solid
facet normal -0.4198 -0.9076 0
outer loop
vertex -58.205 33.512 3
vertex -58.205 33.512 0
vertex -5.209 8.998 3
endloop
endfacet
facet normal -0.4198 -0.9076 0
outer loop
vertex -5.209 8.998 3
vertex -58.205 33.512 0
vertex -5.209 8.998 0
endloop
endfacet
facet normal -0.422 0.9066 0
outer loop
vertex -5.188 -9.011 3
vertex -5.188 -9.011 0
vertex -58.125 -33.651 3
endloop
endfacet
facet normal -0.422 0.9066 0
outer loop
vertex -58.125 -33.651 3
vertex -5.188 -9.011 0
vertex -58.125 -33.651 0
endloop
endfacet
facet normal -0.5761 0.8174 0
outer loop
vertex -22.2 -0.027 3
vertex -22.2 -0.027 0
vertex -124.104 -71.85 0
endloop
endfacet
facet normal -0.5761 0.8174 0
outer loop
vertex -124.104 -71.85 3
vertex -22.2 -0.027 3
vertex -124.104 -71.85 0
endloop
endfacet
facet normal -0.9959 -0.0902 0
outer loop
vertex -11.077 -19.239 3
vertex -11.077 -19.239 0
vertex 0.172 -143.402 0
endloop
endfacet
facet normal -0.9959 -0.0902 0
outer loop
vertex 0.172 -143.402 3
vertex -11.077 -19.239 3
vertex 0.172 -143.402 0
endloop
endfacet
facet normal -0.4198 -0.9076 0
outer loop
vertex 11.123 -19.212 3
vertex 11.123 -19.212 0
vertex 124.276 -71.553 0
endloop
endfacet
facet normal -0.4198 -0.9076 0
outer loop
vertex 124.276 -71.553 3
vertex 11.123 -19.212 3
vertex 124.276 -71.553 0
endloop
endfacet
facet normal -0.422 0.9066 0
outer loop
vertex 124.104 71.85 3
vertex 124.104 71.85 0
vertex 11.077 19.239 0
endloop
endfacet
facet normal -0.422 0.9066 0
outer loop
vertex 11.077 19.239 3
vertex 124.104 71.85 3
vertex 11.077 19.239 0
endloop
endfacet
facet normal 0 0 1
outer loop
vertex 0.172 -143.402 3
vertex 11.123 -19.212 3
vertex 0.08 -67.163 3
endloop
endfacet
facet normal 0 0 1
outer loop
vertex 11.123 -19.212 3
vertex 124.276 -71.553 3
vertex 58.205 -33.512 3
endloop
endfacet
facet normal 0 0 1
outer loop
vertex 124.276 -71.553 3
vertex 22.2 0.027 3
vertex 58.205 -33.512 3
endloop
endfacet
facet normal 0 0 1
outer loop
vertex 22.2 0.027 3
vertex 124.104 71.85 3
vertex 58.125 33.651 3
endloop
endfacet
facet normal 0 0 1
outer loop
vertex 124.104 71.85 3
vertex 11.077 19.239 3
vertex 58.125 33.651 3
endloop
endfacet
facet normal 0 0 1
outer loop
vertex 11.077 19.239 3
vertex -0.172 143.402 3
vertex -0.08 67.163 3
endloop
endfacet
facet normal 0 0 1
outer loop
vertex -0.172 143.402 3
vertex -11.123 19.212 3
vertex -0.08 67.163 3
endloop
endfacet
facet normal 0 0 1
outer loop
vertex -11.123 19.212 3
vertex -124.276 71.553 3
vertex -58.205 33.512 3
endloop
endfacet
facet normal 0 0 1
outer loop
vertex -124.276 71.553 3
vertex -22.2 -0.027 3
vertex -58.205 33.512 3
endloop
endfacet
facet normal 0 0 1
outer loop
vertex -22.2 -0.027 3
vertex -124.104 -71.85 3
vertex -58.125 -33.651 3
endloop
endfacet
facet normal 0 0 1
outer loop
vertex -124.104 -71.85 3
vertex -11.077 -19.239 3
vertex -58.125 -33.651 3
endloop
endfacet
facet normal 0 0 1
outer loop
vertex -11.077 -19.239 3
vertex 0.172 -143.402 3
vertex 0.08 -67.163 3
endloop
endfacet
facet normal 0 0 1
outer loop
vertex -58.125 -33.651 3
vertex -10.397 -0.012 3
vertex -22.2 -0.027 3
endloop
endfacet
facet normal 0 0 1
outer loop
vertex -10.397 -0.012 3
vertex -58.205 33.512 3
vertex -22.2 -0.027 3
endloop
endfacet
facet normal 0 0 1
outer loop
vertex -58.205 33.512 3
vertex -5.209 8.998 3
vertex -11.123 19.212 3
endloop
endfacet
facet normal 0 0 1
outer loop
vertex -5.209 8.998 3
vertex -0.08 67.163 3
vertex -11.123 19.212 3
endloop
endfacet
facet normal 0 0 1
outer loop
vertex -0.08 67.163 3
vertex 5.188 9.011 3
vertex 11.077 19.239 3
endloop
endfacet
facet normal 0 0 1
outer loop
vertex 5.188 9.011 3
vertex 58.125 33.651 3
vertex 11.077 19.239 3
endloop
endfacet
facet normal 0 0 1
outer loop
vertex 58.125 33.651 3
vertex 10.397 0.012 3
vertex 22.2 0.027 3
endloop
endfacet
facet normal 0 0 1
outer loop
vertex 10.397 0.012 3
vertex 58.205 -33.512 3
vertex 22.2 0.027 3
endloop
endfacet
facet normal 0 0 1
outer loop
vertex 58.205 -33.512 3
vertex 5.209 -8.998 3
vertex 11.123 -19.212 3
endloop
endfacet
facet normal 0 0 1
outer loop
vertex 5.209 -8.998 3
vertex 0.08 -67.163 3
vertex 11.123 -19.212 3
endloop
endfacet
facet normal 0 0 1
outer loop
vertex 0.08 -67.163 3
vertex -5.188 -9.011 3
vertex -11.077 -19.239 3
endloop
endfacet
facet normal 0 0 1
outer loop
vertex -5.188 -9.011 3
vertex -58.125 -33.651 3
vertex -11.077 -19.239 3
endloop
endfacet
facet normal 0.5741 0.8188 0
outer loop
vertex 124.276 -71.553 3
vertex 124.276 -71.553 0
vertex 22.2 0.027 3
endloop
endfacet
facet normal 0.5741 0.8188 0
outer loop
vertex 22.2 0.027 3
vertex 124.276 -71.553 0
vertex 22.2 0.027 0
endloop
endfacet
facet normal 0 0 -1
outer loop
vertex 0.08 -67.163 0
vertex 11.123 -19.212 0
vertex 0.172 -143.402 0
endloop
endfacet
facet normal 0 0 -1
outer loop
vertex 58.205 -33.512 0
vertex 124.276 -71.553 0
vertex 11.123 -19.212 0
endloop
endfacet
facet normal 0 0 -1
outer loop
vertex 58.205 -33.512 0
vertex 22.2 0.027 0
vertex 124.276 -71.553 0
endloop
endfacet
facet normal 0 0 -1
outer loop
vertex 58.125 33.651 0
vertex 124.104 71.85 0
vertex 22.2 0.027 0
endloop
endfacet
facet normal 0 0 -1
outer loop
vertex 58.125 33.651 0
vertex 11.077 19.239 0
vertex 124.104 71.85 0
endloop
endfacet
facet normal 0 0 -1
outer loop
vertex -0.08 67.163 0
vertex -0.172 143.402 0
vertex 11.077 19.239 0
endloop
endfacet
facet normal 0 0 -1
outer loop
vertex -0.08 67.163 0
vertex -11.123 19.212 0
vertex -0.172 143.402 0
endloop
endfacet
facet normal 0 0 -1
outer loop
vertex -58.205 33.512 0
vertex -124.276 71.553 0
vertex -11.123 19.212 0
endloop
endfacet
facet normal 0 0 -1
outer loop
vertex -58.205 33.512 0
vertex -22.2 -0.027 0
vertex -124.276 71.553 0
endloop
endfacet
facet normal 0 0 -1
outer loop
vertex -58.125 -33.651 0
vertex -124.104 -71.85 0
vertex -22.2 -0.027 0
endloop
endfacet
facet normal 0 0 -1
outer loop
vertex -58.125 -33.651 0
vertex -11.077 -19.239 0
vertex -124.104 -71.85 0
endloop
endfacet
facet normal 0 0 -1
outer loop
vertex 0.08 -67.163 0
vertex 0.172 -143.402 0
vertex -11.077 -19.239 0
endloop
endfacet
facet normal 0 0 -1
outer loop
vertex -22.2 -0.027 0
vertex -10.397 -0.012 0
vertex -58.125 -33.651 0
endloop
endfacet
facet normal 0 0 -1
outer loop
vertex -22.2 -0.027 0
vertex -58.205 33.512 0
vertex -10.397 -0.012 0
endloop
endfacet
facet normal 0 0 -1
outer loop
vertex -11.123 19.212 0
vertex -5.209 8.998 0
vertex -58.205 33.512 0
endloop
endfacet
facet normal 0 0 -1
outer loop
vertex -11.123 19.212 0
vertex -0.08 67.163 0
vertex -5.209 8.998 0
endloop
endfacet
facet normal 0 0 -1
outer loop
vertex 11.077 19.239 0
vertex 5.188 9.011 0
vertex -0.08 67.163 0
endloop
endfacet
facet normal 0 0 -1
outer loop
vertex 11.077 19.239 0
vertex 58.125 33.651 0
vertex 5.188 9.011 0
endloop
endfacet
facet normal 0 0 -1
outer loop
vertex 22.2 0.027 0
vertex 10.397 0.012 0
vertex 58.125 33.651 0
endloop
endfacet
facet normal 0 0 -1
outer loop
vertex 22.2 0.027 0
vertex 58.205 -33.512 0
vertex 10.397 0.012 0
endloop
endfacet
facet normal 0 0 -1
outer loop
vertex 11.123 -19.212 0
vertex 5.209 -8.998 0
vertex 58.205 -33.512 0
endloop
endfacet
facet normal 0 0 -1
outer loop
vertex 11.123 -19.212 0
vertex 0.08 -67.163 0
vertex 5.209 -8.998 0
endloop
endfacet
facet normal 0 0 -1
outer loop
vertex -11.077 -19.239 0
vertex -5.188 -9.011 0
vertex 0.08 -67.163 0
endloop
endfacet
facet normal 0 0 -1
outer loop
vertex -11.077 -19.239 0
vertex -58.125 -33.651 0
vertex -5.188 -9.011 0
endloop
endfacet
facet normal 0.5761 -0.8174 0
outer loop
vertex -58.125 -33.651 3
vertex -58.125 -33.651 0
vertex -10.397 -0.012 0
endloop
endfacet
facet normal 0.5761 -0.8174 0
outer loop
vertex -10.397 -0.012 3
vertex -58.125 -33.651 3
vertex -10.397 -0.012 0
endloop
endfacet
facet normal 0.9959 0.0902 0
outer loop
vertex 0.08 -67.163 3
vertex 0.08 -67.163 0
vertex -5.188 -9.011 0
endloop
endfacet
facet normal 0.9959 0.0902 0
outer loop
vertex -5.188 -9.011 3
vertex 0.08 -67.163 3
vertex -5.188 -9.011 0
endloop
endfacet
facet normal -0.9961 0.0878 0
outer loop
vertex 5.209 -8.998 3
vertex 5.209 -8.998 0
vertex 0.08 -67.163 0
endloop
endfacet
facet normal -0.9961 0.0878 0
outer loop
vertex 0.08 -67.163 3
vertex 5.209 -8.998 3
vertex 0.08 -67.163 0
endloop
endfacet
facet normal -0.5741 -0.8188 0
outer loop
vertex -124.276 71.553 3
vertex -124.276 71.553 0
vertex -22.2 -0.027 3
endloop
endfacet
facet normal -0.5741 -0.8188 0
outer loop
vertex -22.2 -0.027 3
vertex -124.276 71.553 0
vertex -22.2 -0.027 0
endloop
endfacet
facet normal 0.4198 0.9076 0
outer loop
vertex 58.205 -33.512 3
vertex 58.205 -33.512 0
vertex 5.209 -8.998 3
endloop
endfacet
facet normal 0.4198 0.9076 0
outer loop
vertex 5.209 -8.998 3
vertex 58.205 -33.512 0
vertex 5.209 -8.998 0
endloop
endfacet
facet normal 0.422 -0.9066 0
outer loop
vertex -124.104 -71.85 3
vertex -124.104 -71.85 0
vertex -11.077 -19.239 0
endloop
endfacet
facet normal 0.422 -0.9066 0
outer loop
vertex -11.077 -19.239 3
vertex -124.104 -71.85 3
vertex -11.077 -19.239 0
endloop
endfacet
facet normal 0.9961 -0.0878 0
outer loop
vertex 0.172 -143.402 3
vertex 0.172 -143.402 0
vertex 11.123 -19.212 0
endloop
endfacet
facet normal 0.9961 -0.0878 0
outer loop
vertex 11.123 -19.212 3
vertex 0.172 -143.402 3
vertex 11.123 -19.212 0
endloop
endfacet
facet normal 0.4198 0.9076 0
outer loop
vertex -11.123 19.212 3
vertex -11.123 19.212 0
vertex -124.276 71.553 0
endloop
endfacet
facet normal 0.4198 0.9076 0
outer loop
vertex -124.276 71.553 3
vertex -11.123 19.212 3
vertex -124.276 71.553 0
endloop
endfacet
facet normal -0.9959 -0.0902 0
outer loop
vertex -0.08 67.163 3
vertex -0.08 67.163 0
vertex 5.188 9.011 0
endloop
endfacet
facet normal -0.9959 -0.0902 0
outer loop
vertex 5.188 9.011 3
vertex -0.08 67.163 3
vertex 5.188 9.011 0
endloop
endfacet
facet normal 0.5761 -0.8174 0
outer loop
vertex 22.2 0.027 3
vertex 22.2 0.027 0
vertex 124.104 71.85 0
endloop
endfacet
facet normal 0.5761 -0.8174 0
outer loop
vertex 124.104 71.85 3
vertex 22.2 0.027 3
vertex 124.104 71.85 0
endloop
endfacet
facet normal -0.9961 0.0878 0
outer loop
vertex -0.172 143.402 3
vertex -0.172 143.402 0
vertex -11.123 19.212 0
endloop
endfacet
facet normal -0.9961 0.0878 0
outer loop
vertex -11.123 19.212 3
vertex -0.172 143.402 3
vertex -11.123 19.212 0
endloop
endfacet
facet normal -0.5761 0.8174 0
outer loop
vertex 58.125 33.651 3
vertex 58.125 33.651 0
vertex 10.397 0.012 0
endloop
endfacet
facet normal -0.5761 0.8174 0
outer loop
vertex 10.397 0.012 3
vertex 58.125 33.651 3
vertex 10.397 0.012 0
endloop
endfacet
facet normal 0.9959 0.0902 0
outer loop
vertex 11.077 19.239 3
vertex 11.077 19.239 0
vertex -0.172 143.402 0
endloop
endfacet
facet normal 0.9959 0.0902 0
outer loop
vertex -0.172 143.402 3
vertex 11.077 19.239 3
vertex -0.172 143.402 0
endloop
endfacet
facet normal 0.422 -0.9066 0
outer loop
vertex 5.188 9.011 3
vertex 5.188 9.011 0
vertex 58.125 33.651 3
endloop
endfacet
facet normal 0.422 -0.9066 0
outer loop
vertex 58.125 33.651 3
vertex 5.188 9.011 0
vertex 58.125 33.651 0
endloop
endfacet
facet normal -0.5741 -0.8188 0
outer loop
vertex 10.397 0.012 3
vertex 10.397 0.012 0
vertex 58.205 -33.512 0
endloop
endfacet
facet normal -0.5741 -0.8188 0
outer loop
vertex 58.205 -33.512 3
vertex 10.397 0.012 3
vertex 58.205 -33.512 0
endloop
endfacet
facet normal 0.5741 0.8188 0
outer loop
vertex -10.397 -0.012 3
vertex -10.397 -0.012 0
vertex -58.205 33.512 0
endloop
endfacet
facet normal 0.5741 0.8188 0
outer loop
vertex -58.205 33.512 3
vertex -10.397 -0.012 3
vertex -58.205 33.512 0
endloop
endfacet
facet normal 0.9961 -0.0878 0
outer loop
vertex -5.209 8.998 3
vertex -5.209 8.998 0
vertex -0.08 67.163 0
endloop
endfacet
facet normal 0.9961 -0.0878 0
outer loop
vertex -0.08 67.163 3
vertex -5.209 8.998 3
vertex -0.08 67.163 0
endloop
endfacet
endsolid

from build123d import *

# Parameters (mm, degrees)
F1_DEPTH = 3


with BuildPart() as f1:
    # F0 (on Top) → F1 (new body)
    with BuildSketch(Plane.XY):
        Polygon((0.17165, -143.402397), (11.122826, -19.212155), (124.275944, -71.552546), (22.199627, 0.026572), (124.104294, 71.849852), (11.076801, 19.238727), (-0.17165, 143.402397), (-11.122826, 19.212155), (-124.275944, 71.552546), (-22.199627, -0.026572), (-124.104294, -71.849852), (-11.076801, -19.238727), align=None)
        Polygon((-10.397267, -0.012445), (-58.205037, 33.511865), (-5.209411, 8.998074), (-0.080393, 67.162973), (5.187855, 9.01052), (58.124645, 33.651109), (10.397267, 0.012445), (58.205037, -33.511865), (5.209411, -8.998074), (0.080393, -67.162973), (-5.187855, -9.01052), (-58.124645, -33.651109), align=None, mode=Mode.SUBTRACT)
    extrude(amount=F1_DEPTH)


solid = f1.part
